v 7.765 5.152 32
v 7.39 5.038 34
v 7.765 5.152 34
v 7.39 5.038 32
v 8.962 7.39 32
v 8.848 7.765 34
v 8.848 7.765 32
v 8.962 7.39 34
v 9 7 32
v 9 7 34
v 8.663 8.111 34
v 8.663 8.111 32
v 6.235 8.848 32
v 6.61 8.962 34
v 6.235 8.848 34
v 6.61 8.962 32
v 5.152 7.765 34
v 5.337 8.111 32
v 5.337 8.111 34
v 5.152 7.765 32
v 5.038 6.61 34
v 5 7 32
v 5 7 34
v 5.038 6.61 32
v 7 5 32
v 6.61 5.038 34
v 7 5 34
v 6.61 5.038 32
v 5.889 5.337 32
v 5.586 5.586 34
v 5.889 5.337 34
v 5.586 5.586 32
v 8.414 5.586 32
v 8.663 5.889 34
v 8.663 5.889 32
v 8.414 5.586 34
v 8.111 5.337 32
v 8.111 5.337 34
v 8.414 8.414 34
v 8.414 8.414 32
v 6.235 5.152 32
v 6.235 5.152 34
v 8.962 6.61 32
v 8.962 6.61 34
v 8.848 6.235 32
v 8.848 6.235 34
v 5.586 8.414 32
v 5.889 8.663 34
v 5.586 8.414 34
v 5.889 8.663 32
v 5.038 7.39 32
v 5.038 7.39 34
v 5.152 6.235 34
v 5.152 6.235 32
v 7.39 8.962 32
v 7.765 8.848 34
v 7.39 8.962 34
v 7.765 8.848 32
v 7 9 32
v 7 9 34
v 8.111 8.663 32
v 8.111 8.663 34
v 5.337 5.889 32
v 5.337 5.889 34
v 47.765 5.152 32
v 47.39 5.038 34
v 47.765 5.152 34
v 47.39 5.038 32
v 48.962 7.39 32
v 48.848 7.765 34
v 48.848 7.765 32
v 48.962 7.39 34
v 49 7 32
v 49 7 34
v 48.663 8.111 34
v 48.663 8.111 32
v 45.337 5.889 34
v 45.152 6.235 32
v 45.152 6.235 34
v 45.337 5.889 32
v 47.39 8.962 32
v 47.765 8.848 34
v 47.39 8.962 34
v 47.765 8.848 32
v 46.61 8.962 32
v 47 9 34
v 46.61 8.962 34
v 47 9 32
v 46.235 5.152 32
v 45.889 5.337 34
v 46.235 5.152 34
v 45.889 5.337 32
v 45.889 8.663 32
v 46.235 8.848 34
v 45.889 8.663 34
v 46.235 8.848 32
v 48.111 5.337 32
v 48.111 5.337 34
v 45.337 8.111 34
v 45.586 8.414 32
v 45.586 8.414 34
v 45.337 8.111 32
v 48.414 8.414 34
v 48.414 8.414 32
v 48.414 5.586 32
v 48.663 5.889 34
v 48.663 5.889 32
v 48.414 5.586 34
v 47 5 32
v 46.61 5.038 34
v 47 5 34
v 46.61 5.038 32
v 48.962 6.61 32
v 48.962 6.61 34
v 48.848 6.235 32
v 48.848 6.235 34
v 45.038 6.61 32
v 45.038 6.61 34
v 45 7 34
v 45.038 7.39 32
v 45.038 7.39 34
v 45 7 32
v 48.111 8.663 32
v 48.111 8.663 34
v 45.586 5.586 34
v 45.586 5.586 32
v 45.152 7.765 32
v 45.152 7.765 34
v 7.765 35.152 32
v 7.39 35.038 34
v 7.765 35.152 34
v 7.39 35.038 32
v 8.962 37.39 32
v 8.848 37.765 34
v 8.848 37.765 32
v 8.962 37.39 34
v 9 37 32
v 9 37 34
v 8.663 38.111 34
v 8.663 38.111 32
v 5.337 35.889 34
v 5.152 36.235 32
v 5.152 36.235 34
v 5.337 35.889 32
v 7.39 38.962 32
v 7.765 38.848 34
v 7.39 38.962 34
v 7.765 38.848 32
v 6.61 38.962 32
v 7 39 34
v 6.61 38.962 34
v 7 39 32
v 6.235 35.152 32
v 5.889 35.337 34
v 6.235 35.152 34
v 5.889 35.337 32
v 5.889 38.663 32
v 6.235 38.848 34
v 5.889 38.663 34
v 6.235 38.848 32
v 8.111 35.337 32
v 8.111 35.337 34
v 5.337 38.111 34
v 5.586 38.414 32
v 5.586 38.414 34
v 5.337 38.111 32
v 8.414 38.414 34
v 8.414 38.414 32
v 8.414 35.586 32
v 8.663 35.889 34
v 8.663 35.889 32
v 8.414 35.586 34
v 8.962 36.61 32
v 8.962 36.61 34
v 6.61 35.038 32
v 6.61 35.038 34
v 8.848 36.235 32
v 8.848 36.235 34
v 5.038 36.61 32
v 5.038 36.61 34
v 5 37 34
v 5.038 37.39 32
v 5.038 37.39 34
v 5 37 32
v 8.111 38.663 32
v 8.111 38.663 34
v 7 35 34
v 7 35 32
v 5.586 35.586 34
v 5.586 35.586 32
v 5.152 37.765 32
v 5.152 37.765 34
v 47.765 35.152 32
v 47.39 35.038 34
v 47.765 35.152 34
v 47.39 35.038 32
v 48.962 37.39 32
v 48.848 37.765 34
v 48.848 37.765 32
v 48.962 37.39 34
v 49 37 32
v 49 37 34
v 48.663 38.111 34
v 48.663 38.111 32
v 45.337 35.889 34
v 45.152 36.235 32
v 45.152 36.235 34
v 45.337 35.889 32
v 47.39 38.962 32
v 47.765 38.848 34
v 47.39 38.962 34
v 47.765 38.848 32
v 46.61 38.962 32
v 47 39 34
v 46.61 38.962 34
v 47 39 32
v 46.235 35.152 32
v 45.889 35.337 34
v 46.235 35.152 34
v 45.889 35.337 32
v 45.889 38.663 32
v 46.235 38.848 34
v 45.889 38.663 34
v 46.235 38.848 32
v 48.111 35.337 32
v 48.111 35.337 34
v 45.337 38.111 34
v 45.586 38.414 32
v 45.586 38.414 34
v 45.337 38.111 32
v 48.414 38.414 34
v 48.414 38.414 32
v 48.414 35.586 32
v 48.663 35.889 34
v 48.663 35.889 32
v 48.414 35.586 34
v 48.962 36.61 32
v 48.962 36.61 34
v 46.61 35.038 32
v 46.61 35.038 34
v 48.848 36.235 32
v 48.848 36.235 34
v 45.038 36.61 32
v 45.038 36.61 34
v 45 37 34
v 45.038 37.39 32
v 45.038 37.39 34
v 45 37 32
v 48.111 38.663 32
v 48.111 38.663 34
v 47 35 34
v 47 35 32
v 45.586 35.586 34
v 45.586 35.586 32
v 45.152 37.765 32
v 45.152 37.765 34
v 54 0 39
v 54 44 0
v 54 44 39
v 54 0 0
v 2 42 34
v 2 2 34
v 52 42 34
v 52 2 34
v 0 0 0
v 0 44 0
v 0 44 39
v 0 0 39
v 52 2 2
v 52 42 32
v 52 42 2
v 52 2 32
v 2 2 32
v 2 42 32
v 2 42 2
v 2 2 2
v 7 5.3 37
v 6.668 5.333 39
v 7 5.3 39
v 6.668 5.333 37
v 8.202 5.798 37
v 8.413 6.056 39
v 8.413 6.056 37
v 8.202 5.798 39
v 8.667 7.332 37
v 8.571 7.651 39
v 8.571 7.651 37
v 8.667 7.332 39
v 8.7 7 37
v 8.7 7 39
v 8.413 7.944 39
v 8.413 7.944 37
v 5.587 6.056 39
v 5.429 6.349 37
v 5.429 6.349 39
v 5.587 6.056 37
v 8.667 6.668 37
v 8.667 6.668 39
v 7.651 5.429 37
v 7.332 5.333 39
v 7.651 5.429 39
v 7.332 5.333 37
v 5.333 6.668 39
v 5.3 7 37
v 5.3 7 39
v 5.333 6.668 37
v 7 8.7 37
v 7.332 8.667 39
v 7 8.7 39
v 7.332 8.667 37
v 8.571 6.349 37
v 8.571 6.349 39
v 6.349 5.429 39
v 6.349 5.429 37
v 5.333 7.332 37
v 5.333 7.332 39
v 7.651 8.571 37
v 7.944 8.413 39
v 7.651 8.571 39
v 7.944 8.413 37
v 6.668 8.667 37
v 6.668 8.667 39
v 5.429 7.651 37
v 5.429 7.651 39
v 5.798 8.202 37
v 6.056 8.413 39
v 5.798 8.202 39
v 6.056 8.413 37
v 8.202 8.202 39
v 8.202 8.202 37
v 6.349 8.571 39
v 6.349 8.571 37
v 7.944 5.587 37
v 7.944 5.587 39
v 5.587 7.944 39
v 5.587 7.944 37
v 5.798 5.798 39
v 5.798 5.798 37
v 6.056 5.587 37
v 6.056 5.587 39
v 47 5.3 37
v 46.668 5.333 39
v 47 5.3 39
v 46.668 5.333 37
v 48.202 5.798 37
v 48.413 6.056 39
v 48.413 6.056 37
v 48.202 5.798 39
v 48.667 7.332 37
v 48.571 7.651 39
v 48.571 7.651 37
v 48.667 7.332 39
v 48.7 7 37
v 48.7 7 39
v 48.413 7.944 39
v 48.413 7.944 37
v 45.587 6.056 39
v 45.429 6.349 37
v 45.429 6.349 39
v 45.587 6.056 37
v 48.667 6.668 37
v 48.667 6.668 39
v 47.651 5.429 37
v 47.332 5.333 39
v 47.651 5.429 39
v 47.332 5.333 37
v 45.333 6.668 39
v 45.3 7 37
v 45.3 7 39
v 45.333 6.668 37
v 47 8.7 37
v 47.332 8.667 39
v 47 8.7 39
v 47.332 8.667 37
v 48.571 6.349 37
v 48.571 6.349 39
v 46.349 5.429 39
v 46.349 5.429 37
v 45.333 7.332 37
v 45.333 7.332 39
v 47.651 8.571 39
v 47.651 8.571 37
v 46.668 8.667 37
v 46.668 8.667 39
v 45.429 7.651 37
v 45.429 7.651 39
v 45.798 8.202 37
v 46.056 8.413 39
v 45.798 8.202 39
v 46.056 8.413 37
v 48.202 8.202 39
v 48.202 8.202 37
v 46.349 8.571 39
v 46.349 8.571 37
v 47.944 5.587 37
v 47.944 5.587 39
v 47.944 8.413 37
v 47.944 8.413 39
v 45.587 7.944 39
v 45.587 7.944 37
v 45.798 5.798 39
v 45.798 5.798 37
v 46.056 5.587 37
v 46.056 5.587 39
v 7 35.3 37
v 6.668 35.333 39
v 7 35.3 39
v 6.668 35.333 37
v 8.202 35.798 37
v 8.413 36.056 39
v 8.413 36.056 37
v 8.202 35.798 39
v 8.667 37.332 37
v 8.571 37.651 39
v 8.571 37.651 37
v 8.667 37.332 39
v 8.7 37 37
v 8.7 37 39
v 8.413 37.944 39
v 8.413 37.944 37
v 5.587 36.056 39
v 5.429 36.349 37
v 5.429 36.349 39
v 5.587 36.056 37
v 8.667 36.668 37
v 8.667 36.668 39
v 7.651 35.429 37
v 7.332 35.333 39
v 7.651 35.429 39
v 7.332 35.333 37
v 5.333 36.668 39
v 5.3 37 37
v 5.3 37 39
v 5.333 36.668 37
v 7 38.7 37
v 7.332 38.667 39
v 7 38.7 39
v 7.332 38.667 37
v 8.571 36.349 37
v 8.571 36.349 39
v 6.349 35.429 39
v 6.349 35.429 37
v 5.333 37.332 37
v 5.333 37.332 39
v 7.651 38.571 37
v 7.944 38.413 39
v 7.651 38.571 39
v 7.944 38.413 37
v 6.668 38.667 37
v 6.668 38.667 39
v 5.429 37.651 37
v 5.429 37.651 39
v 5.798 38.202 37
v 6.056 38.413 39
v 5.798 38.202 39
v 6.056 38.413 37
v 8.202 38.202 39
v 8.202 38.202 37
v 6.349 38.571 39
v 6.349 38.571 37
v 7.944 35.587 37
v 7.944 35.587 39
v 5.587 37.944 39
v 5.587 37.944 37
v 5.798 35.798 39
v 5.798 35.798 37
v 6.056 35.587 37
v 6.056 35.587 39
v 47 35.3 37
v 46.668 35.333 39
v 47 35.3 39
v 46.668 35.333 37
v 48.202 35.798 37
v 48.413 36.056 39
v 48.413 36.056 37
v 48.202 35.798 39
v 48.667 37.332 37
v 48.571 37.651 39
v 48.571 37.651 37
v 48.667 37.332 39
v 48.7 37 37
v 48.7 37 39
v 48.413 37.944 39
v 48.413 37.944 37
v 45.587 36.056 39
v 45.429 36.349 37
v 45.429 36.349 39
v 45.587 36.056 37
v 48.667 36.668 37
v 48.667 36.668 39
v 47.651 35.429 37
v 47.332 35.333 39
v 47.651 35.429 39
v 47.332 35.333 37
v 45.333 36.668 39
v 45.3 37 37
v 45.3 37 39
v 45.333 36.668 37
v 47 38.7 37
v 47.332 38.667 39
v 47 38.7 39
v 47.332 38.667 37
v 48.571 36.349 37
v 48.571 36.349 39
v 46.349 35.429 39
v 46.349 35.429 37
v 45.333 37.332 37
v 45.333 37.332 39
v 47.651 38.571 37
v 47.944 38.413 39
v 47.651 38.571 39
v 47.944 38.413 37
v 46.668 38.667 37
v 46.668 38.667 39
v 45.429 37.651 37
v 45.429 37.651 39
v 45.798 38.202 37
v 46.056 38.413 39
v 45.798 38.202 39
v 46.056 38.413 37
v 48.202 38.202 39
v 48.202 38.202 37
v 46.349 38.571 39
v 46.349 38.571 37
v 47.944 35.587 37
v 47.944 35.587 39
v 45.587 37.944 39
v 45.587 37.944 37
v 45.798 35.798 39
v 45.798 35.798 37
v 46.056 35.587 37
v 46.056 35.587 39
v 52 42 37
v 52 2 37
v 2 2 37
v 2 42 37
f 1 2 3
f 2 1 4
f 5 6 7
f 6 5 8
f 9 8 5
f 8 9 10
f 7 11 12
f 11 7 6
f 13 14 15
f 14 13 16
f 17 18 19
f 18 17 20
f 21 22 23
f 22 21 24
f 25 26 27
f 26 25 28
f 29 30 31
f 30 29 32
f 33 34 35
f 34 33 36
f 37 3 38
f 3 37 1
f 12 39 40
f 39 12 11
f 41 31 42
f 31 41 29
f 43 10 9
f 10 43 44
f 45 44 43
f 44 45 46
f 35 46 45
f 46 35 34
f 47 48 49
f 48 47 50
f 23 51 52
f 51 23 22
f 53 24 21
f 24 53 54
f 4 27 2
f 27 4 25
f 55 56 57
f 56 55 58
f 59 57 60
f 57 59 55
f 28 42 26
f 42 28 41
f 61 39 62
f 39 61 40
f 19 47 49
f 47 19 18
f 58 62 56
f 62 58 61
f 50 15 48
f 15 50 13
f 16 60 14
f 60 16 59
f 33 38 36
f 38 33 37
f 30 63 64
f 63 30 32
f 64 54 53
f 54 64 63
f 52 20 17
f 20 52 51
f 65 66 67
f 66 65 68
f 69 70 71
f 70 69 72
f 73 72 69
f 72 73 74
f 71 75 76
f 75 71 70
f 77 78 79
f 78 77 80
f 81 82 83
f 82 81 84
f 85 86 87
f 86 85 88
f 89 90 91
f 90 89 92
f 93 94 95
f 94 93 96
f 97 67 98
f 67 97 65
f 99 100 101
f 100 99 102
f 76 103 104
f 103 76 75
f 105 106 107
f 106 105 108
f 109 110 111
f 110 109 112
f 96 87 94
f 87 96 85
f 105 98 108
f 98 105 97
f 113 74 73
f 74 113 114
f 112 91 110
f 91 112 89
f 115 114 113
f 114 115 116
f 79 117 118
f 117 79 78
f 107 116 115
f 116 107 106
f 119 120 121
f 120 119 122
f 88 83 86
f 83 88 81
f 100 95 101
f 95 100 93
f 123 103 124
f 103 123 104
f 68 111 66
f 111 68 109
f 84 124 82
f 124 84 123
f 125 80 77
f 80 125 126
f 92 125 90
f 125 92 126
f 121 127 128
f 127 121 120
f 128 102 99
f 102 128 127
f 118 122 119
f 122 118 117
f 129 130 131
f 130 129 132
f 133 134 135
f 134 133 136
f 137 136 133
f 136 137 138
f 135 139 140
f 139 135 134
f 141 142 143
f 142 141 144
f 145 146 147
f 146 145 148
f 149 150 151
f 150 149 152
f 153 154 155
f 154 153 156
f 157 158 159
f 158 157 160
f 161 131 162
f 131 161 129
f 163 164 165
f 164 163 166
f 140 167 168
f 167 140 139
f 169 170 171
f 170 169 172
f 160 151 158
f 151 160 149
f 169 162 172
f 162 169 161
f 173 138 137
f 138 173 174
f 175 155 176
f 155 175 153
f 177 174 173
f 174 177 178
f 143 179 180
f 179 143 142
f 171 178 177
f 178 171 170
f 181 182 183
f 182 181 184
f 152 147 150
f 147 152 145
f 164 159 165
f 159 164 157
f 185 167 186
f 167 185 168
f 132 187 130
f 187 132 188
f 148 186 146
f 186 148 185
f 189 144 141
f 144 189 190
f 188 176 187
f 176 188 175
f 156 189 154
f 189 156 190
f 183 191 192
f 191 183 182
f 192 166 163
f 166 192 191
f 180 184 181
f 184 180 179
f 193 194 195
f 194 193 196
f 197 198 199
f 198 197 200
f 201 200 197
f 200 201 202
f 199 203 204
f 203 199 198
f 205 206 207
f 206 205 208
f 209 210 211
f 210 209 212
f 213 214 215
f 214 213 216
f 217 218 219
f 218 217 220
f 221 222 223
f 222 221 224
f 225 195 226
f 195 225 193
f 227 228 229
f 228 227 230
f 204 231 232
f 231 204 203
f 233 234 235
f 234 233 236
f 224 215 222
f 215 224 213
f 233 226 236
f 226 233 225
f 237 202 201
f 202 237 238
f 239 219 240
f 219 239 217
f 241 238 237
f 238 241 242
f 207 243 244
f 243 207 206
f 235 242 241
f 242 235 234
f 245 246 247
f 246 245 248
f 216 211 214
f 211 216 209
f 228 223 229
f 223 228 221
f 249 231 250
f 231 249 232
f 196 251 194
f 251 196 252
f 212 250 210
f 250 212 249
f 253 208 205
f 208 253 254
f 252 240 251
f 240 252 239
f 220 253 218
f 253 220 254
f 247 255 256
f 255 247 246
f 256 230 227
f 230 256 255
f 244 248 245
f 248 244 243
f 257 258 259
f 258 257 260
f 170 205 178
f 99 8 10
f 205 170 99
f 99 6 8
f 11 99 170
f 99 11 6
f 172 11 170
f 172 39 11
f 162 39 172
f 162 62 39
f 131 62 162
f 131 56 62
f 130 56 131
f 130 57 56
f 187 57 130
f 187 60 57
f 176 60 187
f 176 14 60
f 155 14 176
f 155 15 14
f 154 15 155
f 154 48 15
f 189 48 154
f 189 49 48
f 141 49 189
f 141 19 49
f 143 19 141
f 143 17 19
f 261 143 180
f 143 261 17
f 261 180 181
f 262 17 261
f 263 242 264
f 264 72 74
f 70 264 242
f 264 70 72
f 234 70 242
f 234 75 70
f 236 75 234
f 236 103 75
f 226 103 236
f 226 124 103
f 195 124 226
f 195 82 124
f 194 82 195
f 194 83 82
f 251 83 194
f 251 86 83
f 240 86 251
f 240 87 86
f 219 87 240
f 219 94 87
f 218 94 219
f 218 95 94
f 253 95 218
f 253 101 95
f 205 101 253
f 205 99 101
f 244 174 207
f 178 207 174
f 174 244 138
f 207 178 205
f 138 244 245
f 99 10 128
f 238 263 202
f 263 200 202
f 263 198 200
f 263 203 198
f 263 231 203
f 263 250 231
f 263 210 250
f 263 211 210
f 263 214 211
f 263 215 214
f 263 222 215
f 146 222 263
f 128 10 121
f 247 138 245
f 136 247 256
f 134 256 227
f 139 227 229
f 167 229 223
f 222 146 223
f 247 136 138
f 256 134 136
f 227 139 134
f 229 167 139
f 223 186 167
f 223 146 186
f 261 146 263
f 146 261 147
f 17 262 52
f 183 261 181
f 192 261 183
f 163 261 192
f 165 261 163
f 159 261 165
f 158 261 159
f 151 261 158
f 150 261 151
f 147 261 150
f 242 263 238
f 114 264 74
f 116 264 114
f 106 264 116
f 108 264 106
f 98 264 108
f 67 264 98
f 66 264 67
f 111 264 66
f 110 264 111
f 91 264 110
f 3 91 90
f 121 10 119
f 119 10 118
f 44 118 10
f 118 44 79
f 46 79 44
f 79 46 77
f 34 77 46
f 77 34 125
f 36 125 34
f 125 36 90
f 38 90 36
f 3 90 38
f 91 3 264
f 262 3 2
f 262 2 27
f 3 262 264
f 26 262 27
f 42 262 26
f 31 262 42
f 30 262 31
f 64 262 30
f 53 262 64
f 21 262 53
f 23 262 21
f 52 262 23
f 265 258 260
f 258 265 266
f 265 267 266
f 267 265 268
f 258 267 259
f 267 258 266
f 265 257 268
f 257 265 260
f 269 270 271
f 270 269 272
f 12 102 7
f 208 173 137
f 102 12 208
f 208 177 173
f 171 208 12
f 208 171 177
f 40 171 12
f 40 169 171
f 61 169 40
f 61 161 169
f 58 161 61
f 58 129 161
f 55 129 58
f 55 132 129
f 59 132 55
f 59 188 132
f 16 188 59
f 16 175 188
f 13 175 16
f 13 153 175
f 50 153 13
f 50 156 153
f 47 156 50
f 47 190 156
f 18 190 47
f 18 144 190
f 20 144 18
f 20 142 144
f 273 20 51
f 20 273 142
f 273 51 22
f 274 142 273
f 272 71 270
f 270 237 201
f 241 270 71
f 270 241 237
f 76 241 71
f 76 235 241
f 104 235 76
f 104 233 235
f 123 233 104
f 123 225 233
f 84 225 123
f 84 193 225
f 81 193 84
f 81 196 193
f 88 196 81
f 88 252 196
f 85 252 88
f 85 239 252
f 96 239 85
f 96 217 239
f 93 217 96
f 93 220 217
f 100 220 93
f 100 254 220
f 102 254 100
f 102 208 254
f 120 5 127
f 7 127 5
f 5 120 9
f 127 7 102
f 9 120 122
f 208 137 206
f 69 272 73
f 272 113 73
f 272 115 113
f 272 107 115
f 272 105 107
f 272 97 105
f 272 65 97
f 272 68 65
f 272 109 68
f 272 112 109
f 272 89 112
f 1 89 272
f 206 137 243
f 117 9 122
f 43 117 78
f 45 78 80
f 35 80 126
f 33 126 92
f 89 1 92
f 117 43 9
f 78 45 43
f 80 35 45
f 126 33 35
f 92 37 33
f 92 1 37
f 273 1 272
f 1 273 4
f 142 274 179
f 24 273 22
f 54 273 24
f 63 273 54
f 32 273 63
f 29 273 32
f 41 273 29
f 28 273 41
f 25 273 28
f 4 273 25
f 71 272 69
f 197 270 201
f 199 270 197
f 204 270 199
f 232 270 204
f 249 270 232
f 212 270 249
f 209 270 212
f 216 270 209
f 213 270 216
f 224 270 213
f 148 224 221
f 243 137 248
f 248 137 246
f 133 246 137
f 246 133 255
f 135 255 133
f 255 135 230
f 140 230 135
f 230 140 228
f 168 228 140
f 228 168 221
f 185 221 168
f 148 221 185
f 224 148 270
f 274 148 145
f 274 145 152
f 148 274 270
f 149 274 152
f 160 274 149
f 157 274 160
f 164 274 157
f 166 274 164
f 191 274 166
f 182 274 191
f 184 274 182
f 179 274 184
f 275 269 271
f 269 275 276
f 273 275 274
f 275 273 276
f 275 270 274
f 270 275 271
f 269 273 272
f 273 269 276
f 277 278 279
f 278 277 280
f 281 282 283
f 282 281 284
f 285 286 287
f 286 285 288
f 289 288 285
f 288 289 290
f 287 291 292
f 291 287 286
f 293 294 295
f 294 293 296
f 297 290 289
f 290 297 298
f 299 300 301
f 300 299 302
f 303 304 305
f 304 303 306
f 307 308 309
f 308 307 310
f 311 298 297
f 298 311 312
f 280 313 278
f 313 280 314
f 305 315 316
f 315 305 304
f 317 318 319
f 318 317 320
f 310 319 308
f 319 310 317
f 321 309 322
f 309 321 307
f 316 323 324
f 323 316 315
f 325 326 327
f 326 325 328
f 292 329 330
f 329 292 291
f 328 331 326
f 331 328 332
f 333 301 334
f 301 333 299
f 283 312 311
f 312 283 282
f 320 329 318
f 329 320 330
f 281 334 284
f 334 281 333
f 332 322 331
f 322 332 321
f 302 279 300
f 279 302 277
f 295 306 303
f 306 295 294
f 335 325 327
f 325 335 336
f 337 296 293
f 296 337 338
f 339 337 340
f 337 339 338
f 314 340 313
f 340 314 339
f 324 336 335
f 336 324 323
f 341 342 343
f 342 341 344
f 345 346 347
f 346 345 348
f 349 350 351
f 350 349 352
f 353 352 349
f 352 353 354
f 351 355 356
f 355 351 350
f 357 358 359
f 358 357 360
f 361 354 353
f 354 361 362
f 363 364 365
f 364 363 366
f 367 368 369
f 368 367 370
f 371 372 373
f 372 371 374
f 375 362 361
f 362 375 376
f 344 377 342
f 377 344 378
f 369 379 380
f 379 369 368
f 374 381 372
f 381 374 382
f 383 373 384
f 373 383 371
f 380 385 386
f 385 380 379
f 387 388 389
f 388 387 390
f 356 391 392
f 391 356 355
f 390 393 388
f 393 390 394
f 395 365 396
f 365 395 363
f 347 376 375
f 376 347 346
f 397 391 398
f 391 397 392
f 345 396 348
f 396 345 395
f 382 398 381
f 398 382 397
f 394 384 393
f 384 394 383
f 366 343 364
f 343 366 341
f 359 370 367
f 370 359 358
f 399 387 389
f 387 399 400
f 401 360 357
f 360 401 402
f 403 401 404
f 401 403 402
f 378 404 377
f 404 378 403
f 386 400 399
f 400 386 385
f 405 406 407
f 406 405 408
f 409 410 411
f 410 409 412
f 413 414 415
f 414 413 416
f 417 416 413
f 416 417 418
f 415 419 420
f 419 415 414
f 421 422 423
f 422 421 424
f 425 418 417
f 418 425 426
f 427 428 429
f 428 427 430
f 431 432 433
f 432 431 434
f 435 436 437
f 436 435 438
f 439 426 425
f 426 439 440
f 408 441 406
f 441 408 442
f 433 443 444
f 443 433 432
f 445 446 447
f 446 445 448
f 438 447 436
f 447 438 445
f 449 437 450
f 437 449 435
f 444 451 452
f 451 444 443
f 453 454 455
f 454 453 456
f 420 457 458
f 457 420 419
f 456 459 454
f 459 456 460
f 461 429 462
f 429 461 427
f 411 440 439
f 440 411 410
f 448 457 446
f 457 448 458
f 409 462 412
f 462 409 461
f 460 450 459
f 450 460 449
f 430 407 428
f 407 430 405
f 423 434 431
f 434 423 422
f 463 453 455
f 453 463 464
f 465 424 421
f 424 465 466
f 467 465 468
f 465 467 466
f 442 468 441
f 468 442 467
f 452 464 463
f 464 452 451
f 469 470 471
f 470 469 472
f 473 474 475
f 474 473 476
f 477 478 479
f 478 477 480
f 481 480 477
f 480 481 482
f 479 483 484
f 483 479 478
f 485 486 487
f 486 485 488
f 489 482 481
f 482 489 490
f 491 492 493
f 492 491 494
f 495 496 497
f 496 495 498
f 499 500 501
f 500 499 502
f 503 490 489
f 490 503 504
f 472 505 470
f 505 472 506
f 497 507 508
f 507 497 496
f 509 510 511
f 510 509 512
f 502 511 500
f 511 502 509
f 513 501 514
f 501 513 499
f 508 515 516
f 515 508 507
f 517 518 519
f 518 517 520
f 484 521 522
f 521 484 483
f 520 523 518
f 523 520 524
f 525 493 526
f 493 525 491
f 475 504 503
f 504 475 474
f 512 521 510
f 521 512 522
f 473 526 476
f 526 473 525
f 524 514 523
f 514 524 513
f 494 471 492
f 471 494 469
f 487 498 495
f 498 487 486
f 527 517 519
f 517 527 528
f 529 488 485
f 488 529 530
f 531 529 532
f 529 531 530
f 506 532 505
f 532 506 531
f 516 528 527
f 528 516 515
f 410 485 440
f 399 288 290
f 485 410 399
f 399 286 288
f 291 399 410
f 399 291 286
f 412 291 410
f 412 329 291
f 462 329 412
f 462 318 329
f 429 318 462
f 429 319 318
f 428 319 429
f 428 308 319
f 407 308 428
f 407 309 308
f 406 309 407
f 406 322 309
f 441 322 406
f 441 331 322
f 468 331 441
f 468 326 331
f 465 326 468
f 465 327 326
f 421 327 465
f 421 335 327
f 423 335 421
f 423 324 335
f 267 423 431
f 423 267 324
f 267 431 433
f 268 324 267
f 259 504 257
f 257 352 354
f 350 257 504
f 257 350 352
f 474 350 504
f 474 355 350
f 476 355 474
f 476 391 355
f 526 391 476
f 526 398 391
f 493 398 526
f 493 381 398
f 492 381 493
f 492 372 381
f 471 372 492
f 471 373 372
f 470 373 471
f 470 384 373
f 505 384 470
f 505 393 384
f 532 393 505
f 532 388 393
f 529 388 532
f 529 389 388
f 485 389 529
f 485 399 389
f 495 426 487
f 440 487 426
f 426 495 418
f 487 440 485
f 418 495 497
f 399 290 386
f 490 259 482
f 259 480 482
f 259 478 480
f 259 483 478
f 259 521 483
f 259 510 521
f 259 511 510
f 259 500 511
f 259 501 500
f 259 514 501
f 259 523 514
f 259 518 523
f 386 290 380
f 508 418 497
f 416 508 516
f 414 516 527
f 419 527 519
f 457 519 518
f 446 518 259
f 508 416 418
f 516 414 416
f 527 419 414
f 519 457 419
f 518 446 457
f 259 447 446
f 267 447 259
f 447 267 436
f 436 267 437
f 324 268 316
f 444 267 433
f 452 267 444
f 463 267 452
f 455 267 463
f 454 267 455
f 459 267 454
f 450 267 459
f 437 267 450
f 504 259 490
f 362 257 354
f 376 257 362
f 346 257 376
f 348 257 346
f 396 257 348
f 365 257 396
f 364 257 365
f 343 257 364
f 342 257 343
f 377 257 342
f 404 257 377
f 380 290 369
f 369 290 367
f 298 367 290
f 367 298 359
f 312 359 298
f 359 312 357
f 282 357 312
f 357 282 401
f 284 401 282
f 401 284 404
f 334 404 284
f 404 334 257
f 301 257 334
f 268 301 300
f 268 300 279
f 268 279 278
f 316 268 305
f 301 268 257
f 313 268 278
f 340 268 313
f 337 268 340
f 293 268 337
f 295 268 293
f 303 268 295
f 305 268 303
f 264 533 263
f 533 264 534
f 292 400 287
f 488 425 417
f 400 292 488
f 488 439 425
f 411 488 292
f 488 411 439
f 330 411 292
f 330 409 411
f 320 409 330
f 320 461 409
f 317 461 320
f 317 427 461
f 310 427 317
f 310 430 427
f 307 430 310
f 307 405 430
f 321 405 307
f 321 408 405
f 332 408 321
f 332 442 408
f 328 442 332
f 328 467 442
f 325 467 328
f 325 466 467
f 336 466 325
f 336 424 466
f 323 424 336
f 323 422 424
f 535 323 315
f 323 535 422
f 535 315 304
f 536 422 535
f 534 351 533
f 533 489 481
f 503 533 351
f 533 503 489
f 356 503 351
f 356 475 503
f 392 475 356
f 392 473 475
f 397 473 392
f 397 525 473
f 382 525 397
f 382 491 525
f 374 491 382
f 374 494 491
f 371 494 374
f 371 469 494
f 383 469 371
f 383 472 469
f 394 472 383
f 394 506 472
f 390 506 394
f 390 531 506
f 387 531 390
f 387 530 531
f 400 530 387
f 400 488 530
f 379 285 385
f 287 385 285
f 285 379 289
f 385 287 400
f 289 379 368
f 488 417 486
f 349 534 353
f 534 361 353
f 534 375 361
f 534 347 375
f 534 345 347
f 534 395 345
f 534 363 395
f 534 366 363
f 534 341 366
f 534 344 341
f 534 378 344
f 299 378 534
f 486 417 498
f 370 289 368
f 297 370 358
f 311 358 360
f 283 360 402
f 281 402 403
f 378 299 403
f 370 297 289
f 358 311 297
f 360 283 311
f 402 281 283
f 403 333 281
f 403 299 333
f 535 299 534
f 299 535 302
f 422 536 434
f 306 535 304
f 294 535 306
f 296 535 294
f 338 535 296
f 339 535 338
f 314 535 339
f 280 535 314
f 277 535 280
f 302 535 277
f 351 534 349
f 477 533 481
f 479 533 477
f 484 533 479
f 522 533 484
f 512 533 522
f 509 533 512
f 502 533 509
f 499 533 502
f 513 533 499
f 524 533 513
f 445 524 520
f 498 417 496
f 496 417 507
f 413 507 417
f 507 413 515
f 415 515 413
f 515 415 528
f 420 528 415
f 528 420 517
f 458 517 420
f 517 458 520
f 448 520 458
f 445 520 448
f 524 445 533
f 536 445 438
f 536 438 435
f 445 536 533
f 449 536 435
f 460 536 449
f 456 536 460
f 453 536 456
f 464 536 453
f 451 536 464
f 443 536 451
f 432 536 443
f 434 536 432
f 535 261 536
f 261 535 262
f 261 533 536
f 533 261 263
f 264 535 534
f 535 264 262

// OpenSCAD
// 3D-Printable Two-Part Enclosure with M3 Heat-Set Insert Fastening
// Internal cavity: 50 x 40 x 30 mm | Wall thickness: 2.0 mm

// Enclosure external dimensions
base_ext_x = 54;
base_ext_y = 44;
base_height = 34;
wall_thick = 2.0;

// Internal cavity dimensions
cavity_x = 50;
cavity_y = 40;
cavity_depth = 30;

// Lid dimensions
lid_height = 5;
lid_pocket_depth = 3;

// M3 fastening parameters
insert_hole_dia = 4.0;    // Boss hole for MB-HSI-M3
insert_length = 4.0;
screw_clearance_hole = 3.4; // Normal clearance for M3

// Corner screw positions (offset from edges)
hole_offset = 7;
screw_positions = [
    [hole_offset, hole_offset],
    [base_ext_x - hole_offset, hole_offset],
    [hole_offset, base_ext_y - hole_offset],
    [base_ext_x - hole_offset, base_ext_y - hole_offset]
];

module base() {
    difference() {
        // Solid outer shell
        cube([base_ext_x, base_ext_y, base_height]);
        
        // Main internal cavity
        translate([(base_ext_x - cavity_x)/2, (base_ext_y - cavity_y)/2, wall_thick])
            cube([cavity_x, cavity_y, cavity_depth]);
        
        // Insert holes at top surface (4 mm deep)
        for (pos = screw_positions) {
            translate([pos[0], pos[1], base_height - insert_length])
                cylinder(h=insert_length + 0.1, d=insert_hole_dia, $fn=32);
        }
    }
}

module lid() {
    translate([0, 0, base_height])
    difference() {
        // Solid lid outer shell
        cube([base_ext_x, base_ext_y, lid_height]);
        
        // Seating pocket (aligns with cavity)
        translate([(base_ext_x - cavity_x)/2, (base_ext_y - cavity_y)/2, 0])
            cube([cavity_x, cavity_y, lid_pocket_depth]);
        
        // Clearance holes for M3 screws (through entire lid)
        for (pos = screw_positions) {
            translate([pos[0], pos[1], -0.1])
                cylinder(h=lid_height + 0.2, d=screw_clearance_hole, $fn=32);
        }
    }
}

// Render assembled enclosure (base and lid in final positions, non-interfering)
base();
lid();

/* BOM - Bill of Materials:
   4x MB-SHCS-M3-08 (M3 Socket Head Cap Screw, 8mm length, alloy steel)
   4x MB-HSI-M3 (M3 Heat-Set Insert, brass, 4.0mm length, 4.6mm OD)
*/
